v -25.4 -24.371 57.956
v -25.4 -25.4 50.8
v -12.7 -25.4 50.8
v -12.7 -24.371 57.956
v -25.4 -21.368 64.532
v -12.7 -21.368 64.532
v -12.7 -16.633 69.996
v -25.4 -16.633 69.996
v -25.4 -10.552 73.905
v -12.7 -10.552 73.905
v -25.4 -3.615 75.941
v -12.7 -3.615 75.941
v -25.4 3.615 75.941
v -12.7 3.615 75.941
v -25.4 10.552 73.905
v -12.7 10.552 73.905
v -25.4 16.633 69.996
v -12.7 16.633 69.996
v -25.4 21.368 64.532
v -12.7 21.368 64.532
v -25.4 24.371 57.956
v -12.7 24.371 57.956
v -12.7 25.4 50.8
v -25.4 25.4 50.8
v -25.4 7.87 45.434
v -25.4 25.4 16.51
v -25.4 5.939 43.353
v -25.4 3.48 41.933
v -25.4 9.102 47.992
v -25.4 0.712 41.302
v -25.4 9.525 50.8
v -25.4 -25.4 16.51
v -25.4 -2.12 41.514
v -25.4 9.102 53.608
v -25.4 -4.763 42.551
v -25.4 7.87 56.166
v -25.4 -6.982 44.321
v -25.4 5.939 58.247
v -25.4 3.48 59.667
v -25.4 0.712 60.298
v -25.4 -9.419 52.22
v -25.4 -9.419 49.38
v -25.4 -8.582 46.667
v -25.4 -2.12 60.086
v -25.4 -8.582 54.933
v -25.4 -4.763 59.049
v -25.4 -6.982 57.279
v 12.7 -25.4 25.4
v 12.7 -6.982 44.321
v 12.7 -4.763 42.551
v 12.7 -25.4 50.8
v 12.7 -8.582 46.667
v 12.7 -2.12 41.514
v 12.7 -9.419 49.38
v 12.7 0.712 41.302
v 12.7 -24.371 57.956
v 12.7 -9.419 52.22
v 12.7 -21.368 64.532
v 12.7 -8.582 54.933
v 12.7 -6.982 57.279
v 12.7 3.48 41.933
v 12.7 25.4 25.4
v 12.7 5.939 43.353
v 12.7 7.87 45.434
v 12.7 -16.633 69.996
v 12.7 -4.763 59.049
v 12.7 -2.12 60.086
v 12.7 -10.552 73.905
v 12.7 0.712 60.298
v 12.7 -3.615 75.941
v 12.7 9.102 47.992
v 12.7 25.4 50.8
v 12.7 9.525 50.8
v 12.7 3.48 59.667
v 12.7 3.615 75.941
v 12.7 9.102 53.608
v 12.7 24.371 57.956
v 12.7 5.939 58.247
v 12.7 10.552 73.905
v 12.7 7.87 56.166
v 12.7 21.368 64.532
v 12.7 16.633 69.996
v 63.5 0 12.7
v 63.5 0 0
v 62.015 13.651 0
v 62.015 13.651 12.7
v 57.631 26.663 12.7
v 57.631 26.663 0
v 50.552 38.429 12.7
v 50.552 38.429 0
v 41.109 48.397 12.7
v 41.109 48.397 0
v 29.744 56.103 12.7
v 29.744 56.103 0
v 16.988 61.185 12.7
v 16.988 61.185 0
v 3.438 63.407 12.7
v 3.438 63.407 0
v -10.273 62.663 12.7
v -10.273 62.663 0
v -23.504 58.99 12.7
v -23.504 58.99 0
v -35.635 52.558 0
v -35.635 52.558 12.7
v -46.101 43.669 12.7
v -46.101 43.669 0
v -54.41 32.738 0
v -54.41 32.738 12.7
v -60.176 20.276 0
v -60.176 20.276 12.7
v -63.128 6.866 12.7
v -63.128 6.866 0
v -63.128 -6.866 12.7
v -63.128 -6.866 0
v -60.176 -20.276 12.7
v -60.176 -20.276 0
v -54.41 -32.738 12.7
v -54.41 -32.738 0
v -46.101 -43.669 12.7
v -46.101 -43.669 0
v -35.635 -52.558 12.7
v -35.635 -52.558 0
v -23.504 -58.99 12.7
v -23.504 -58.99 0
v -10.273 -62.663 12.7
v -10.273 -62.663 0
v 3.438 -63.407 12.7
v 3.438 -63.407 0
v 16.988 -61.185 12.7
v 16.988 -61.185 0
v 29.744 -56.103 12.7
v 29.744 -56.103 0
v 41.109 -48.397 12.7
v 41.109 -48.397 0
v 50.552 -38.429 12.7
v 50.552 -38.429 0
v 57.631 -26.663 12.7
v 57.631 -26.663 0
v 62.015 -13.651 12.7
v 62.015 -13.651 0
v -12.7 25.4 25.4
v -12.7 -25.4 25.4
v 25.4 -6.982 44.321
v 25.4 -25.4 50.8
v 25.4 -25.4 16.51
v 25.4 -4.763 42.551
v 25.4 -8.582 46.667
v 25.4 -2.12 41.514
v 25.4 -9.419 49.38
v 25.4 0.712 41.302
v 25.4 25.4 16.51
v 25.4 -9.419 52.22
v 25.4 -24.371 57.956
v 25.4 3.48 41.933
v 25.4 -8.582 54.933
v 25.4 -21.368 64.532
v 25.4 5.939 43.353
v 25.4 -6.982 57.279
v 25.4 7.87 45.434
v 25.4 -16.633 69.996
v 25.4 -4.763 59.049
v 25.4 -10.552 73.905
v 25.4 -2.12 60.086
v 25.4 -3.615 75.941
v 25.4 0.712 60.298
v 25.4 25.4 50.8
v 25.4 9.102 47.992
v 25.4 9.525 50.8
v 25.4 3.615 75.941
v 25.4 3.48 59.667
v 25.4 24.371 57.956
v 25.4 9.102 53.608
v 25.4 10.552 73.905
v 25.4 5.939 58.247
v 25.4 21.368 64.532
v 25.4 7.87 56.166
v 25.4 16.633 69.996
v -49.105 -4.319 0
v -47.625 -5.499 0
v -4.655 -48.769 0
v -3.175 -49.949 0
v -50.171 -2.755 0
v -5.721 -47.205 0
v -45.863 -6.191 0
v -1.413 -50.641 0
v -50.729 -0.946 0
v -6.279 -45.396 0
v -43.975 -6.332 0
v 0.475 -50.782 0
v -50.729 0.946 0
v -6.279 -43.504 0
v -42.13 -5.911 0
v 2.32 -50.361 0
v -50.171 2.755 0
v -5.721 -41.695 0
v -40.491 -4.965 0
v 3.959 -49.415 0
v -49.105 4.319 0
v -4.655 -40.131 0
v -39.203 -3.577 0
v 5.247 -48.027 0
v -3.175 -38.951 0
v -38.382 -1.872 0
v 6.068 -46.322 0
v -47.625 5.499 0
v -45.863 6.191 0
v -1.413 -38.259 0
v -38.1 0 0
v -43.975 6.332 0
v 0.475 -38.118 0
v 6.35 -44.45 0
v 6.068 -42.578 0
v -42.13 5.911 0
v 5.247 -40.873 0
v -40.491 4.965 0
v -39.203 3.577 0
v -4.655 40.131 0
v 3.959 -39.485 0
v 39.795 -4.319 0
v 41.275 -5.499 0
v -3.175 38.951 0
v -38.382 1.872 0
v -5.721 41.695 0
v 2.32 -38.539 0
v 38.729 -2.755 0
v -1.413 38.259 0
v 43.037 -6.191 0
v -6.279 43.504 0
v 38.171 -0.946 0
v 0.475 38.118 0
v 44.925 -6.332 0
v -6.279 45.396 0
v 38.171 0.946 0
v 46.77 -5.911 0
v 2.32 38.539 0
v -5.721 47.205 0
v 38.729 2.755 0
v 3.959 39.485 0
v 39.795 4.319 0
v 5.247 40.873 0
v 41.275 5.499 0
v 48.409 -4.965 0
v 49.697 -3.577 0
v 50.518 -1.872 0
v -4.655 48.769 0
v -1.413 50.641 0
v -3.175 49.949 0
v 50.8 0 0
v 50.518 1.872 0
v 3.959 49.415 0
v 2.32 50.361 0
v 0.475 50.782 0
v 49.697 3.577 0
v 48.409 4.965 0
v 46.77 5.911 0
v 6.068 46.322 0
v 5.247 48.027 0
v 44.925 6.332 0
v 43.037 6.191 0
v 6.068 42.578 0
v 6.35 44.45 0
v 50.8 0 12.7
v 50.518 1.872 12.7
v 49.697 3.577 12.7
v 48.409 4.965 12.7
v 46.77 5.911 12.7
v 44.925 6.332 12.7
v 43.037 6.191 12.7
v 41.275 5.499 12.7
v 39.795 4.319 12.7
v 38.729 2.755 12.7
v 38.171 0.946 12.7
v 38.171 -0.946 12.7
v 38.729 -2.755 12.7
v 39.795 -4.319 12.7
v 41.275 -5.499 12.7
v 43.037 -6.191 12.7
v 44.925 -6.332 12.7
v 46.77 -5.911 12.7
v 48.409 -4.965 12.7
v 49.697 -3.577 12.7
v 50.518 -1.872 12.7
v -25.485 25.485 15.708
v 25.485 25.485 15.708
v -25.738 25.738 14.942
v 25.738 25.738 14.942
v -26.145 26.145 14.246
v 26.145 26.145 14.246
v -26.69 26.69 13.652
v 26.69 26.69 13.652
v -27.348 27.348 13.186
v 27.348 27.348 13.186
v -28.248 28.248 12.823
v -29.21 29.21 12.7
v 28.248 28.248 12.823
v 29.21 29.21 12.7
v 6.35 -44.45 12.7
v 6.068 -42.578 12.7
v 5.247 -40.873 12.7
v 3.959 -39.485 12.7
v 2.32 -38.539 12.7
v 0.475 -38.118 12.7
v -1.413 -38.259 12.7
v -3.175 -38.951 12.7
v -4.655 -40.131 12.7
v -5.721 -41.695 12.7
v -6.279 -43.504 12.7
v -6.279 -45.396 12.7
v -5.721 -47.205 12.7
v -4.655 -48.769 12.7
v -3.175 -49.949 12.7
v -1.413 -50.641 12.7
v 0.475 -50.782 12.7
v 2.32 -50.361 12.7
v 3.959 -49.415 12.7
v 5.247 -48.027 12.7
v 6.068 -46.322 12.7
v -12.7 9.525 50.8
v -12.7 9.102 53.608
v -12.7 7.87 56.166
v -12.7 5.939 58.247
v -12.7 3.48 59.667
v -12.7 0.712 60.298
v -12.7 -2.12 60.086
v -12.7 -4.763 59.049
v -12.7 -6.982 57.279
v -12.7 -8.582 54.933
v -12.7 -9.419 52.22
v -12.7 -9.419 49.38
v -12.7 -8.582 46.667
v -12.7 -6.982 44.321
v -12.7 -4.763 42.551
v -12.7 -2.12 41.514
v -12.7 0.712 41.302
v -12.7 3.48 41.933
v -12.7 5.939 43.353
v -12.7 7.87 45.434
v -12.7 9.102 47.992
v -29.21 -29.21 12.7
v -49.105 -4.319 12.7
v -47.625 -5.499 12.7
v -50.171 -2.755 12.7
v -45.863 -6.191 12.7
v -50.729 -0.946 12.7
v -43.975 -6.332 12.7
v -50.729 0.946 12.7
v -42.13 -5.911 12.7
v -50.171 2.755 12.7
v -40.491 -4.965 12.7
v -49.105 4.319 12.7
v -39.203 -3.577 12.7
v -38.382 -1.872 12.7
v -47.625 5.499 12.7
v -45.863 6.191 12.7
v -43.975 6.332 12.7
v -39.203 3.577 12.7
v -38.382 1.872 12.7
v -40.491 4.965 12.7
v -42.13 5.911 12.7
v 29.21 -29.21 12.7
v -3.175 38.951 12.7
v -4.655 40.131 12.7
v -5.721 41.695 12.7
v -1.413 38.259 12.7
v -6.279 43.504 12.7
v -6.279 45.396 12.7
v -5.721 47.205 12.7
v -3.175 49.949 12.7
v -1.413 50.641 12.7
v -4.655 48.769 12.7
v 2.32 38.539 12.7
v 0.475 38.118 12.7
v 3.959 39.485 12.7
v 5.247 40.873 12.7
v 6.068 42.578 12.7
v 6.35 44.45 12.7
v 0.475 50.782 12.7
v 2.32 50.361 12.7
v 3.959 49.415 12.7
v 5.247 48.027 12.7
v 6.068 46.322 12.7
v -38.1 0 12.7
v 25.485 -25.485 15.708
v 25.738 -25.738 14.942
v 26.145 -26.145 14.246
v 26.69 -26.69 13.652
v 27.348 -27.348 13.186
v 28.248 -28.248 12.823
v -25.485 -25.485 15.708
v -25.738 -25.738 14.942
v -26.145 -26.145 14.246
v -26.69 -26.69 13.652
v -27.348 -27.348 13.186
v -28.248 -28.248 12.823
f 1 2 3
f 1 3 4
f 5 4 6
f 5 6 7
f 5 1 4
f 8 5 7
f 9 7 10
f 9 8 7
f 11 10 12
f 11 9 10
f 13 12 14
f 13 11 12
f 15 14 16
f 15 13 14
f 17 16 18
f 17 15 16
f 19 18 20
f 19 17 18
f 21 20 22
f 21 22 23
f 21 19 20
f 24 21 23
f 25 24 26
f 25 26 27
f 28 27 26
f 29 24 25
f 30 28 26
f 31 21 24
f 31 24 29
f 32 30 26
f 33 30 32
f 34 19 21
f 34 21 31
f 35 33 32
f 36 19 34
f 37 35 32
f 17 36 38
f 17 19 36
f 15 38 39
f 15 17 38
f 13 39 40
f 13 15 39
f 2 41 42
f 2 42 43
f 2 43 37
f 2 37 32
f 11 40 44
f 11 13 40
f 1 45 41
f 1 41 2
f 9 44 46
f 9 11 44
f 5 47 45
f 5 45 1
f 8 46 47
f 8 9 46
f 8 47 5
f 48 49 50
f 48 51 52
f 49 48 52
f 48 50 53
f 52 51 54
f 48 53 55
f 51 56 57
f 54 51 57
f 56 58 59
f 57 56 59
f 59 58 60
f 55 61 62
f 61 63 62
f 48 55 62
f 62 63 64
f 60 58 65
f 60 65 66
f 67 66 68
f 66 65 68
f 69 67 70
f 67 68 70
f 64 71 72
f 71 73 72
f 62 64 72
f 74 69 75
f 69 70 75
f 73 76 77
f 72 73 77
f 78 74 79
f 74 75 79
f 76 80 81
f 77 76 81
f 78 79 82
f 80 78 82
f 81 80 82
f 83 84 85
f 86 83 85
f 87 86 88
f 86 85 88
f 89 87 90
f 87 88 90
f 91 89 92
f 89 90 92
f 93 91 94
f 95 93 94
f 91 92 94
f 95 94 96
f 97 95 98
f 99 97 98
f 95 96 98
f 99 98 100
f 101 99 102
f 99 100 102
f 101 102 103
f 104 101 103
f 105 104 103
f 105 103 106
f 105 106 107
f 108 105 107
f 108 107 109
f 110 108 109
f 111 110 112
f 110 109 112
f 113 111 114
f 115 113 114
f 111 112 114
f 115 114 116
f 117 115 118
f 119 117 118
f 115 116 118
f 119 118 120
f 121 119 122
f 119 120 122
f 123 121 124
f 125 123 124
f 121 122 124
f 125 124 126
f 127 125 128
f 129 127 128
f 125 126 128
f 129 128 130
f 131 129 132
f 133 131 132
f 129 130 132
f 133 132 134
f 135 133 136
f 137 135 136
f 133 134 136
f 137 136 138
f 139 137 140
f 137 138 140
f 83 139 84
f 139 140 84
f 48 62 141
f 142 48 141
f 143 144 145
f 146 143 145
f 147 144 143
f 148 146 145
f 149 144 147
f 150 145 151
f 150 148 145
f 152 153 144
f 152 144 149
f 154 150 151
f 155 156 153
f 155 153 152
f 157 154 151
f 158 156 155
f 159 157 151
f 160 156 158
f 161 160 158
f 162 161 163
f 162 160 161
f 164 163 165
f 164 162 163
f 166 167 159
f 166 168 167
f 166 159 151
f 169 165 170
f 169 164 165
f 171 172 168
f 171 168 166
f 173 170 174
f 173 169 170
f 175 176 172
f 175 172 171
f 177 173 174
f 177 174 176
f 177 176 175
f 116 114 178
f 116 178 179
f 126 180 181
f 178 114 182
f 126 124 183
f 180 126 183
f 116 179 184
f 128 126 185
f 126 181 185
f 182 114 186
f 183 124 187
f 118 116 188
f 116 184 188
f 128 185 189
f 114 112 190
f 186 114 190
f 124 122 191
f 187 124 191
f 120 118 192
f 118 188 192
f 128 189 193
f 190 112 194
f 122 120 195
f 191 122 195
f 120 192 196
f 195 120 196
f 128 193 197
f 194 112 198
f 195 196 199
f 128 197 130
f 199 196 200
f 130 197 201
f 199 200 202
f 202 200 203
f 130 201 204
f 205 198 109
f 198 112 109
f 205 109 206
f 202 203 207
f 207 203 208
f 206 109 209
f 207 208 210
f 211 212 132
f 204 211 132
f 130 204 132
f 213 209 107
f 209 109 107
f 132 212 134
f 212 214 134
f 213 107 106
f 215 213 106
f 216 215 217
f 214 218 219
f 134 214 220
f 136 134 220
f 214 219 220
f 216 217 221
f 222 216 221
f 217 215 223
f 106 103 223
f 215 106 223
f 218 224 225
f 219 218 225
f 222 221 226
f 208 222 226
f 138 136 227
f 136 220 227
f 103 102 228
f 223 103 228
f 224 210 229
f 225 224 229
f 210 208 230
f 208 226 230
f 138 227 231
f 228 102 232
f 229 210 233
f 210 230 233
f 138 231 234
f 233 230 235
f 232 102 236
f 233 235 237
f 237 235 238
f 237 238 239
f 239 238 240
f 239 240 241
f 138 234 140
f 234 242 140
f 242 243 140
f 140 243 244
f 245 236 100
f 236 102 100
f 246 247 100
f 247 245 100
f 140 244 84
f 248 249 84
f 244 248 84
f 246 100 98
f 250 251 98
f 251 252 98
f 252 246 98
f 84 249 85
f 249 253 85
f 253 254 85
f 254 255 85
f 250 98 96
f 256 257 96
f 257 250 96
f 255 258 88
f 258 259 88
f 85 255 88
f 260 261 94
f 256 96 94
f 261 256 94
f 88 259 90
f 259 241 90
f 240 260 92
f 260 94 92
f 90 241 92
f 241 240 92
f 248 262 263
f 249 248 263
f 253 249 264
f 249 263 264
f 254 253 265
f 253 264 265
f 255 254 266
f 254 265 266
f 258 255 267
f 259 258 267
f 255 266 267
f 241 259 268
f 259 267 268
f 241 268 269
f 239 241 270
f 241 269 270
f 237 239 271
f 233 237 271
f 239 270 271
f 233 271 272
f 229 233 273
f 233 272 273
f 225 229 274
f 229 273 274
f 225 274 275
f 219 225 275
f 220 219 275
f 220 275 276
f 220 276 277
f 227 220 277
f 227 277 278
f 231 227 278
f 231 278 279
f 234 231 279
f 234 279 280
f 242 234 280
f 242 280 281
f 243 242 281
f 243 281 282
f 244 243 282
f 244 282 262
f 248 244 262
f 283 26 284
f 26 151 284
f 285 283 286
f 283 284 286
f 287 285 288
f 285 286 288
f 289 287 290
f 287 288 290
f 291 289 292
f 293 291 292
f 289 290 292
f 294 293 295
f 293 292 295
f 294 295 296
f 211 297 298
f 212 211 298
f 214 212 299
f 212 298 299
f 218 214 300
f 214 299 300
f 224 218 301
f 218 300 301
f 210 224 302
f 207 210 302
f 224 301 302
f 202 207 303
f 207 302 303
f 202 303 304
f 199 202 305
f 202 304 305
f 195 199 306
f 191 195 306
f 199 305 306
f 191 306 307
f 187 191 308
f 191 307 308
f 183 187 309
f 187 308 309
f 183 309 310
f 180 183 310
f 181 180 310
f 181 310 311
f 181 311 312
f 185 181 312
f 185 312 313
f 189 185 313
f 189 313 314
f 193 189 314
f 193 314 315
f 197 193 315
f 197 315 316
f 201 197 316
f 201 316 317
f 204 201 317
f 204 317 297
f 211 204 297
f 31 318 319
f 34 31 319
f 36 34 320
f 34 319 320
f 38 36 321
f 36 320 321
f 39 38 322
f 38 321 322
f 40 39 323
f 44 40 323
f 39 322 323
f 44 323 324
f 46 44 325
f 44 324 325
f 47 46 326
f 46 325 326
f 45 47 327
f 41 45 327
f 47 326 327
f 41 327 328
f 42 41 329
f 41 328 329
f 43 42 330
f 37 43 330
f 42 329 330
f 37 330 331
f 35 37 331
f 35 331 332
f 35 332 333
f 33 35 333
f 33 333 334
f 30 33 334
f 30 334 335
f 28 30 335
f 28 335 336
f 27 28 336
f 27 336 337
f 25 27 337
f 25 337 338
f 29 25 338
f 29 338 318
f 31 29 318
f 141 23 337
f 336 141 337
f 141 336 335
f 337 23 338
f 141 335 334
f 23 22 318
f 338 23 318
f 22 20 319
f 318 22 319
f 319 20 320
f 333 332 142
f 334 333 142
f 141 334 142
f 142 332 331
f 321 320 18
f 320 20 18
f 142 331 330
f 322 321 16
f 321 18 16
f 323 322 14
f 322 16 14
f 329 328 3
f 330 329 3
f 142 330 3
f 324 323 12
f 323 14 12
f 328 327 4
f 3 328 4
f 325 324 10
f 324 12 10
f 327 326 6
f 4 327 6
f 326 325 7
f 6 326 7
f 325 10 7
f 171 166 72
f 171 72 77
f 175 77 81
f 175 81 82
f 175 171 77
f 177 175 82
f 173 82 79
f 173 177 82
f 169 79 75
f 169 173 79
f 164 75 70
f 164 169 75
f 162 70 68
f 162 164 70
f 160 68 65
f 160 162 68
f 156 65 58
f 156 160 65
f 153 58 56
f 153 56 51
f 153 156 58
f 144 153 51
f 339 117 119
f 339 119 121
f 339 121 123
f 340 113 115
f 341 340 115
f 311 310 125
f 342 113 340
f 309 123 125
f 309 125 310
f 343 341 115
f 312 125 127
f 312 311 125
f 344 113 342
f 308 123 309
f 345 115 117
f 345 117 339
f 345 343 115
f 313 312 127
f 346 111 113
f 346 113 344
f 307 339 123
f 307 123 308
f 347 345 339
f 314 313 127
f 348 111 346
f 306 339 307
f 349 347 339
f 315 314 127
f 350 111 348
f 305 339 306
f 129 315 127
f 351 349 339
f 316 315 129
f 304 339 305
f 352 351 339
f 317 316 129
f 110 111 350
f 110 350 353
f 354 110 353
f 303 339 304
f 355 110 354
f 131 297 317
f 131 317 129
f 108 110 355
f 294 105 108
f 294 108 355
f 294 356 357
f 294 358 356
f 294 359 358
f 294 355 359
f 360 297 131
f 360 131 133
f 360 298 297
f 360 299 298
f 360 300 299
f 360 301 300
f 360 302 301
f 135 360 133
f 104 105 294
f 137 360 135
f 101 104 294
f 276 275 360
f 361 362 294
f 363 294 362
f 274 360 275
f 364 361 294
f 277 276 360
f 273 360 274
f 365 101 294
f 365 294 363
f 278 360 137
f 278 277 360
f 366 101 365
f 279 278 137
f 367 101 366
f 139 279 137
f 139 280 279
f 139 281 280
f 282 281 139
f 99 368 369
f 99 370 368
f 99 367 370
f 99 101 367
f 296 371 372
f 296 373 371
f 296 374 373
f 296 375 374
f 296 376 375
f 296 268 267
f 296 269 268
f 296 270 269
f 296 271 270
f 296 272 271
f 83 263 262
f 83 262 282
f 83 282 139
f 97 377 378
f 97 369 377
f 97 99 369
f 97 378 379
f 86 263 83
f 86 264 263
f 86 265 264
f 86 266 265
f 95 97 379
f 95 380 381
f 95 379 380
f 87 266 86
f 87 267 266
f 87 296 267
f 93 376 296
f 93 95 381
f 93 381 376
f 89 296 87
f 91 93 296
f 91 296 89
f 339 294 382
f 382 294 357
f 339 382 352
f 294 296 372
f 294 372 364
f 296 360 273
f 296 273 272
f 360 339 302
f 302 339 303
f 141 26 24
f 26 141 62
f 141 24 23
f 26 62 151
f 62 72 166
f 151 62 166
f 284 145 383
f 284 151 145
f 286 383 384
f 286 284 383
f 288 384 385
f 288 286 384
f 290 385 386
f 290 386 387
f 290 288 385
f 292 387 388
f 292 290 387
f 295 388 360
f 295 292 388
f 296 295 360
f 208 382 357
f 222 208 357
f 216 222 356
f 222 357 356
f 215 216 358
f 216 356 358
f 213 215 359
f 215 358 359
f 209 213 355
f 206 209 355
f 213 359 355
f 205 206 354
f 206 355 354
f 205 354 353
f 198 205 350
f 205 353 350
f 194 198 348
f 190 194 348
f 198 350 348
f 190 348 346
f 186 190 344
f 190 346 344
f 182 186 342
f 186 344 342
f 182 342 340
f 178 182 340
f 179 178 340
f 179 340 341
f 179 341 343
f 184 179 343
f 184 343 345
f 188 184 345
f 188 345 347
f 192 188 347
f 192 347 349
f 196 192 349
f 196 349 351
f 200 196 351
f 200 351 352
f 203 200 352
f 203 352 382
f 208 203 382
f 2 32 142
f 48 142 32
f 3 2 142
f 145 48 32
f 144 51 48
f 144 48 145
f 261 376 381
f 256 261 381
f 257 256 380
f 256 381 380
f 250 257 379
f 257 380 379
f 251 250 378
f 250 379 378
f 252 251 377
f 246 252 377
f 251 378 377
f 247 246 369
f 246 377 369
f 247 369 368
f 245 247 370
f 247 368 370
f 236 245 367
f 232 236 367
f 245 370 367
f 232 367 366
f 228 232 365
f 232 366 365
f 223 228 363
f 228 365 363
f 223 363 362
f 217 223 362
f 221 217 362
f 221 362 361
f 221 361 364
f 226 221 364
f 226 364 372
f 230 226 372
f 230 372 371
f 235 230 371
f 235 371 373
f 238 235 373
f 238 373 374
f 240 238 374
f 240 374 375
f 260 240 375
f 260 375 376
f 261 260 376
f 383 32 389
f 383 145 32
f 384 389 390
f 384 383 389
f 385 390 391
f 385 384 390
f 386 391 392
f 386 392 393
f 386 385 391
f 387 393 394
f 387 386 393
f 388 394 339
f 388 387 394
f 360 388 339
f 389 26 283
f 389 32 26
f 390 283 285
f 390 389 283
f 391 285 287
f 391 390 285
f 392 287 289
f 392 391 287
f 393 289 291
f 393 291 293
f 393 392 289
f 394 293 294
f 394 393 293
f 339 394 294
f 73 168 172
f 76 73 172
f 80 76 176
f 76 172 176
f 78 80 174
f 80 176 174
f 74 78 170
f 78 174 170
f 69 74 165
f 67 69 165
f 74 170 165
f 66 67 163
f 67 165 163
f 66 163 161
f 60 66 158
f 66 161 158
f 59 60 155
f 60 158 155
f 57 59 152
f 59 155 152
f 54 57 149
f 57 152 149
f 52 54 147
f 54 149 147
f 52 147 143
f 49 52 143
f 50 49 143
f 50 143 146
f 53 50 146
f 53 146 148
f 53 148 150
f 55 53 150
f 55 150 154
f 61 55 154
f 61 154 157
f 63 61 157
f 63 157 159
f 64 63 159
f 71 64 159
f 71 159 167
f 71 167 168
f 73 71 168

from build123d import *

# Parameters (mm, degrees)
F0_R      = 63.5
F1_DEPTH  = 12.7
F3_DEPTH  = 25.4
F6_DEPTH  = 12.7
F9_DEPTH  = 12.7
F10_R     = 9.525
F11_DEPTH = 88.901
F12_R     = 6.35
F13_DEPTH = 12.701
F14_R     = 3.81


with BuildPart() as f1:
    # F0 (on Top) → F1 (new body)
    with BuildSketch(Plane.XY):
        Circle(F0_R)
    extrude(amount=F1_DEPTH)

    # F2 (on Front) → F3 (join, symmetric)
    with BuildSketch(Plane.XZ):
        Polygon((-25.4, 50.8), (-25.4, 0), (0, 0), (0, 25.4), (-12.7, 25.4), (-12.7, 50.8), align=None)
        Polygon((0, 25.4), (0, 0), (25.4, 0), (25.4, 50.8), (12.7, 50.8), (12.7, 25.4), align=None)
    extrude(amount=F3_DEPTH, both=True)

    # F5 (on offset) → F6 (join)
    with BuildSketch(Plane.YZ.offset(25.4)):
        with BuildLine():
            Line((-25.4, 50.8), (25.4, 50.8))
            ThreePointArc((25.4, 50.8), (0, 76.2), (-25.4, 50.8))
        make_face()
    extrude(amount=-F6_DEPTH)

    # F8 (on offset) → F9 (join)
    with BuildSketch(Plane(origin=(-25.4, 0, 0), x_dir=(0, -1, 0), z_dir=(-1, 0, 0))):
        with BuildLine():
            Line((-25.4, 50.8), (25.4, 50.8))
            ThreePointArc((25.4, 50.8), (0, 76.2), (-25.4, 50.8))
        make_face()
    extrude(amount=-F9_DEPTH)

    # F10 (on face) → F11 (cut, through all)
    with BuildSketch(Plane.YZ.offset(25.4)):
        with Locations((0, 50.8)):
            Circle(F10_R)
    extrude(amount=-F11_DEPTH, mode=Mode.SUBTRACT)

    # F12 (on face) → F13 (cut, through all)
    with BuildSketch(Plane.XY.offset(12.7)):
        with Locations((0, 44.45)):
            Circle(F12_R)
        with Locations((44.45, 0)):
            Circle(F12_R)
        with Locations((0, -44.45)):
            Circle(F12_R)
        with Locations((-44.45, 0)):
            Circle(F12_R)
    extrude(amount=-F13_DEPTH, mode=Mode.SUBTRACT)

    # F14
    f14_edges = [f1.edges().sort_by_distance(p)[0] for p in [
        (-25.4, 0, 12.7),
        (0, -25.4, 12.7),
        (25.4, 0, 12.7),
        (0, 25.4, 12.7),
    ]]
    fillet(f14_edges, radius=F14_R)


solid = f1.part
